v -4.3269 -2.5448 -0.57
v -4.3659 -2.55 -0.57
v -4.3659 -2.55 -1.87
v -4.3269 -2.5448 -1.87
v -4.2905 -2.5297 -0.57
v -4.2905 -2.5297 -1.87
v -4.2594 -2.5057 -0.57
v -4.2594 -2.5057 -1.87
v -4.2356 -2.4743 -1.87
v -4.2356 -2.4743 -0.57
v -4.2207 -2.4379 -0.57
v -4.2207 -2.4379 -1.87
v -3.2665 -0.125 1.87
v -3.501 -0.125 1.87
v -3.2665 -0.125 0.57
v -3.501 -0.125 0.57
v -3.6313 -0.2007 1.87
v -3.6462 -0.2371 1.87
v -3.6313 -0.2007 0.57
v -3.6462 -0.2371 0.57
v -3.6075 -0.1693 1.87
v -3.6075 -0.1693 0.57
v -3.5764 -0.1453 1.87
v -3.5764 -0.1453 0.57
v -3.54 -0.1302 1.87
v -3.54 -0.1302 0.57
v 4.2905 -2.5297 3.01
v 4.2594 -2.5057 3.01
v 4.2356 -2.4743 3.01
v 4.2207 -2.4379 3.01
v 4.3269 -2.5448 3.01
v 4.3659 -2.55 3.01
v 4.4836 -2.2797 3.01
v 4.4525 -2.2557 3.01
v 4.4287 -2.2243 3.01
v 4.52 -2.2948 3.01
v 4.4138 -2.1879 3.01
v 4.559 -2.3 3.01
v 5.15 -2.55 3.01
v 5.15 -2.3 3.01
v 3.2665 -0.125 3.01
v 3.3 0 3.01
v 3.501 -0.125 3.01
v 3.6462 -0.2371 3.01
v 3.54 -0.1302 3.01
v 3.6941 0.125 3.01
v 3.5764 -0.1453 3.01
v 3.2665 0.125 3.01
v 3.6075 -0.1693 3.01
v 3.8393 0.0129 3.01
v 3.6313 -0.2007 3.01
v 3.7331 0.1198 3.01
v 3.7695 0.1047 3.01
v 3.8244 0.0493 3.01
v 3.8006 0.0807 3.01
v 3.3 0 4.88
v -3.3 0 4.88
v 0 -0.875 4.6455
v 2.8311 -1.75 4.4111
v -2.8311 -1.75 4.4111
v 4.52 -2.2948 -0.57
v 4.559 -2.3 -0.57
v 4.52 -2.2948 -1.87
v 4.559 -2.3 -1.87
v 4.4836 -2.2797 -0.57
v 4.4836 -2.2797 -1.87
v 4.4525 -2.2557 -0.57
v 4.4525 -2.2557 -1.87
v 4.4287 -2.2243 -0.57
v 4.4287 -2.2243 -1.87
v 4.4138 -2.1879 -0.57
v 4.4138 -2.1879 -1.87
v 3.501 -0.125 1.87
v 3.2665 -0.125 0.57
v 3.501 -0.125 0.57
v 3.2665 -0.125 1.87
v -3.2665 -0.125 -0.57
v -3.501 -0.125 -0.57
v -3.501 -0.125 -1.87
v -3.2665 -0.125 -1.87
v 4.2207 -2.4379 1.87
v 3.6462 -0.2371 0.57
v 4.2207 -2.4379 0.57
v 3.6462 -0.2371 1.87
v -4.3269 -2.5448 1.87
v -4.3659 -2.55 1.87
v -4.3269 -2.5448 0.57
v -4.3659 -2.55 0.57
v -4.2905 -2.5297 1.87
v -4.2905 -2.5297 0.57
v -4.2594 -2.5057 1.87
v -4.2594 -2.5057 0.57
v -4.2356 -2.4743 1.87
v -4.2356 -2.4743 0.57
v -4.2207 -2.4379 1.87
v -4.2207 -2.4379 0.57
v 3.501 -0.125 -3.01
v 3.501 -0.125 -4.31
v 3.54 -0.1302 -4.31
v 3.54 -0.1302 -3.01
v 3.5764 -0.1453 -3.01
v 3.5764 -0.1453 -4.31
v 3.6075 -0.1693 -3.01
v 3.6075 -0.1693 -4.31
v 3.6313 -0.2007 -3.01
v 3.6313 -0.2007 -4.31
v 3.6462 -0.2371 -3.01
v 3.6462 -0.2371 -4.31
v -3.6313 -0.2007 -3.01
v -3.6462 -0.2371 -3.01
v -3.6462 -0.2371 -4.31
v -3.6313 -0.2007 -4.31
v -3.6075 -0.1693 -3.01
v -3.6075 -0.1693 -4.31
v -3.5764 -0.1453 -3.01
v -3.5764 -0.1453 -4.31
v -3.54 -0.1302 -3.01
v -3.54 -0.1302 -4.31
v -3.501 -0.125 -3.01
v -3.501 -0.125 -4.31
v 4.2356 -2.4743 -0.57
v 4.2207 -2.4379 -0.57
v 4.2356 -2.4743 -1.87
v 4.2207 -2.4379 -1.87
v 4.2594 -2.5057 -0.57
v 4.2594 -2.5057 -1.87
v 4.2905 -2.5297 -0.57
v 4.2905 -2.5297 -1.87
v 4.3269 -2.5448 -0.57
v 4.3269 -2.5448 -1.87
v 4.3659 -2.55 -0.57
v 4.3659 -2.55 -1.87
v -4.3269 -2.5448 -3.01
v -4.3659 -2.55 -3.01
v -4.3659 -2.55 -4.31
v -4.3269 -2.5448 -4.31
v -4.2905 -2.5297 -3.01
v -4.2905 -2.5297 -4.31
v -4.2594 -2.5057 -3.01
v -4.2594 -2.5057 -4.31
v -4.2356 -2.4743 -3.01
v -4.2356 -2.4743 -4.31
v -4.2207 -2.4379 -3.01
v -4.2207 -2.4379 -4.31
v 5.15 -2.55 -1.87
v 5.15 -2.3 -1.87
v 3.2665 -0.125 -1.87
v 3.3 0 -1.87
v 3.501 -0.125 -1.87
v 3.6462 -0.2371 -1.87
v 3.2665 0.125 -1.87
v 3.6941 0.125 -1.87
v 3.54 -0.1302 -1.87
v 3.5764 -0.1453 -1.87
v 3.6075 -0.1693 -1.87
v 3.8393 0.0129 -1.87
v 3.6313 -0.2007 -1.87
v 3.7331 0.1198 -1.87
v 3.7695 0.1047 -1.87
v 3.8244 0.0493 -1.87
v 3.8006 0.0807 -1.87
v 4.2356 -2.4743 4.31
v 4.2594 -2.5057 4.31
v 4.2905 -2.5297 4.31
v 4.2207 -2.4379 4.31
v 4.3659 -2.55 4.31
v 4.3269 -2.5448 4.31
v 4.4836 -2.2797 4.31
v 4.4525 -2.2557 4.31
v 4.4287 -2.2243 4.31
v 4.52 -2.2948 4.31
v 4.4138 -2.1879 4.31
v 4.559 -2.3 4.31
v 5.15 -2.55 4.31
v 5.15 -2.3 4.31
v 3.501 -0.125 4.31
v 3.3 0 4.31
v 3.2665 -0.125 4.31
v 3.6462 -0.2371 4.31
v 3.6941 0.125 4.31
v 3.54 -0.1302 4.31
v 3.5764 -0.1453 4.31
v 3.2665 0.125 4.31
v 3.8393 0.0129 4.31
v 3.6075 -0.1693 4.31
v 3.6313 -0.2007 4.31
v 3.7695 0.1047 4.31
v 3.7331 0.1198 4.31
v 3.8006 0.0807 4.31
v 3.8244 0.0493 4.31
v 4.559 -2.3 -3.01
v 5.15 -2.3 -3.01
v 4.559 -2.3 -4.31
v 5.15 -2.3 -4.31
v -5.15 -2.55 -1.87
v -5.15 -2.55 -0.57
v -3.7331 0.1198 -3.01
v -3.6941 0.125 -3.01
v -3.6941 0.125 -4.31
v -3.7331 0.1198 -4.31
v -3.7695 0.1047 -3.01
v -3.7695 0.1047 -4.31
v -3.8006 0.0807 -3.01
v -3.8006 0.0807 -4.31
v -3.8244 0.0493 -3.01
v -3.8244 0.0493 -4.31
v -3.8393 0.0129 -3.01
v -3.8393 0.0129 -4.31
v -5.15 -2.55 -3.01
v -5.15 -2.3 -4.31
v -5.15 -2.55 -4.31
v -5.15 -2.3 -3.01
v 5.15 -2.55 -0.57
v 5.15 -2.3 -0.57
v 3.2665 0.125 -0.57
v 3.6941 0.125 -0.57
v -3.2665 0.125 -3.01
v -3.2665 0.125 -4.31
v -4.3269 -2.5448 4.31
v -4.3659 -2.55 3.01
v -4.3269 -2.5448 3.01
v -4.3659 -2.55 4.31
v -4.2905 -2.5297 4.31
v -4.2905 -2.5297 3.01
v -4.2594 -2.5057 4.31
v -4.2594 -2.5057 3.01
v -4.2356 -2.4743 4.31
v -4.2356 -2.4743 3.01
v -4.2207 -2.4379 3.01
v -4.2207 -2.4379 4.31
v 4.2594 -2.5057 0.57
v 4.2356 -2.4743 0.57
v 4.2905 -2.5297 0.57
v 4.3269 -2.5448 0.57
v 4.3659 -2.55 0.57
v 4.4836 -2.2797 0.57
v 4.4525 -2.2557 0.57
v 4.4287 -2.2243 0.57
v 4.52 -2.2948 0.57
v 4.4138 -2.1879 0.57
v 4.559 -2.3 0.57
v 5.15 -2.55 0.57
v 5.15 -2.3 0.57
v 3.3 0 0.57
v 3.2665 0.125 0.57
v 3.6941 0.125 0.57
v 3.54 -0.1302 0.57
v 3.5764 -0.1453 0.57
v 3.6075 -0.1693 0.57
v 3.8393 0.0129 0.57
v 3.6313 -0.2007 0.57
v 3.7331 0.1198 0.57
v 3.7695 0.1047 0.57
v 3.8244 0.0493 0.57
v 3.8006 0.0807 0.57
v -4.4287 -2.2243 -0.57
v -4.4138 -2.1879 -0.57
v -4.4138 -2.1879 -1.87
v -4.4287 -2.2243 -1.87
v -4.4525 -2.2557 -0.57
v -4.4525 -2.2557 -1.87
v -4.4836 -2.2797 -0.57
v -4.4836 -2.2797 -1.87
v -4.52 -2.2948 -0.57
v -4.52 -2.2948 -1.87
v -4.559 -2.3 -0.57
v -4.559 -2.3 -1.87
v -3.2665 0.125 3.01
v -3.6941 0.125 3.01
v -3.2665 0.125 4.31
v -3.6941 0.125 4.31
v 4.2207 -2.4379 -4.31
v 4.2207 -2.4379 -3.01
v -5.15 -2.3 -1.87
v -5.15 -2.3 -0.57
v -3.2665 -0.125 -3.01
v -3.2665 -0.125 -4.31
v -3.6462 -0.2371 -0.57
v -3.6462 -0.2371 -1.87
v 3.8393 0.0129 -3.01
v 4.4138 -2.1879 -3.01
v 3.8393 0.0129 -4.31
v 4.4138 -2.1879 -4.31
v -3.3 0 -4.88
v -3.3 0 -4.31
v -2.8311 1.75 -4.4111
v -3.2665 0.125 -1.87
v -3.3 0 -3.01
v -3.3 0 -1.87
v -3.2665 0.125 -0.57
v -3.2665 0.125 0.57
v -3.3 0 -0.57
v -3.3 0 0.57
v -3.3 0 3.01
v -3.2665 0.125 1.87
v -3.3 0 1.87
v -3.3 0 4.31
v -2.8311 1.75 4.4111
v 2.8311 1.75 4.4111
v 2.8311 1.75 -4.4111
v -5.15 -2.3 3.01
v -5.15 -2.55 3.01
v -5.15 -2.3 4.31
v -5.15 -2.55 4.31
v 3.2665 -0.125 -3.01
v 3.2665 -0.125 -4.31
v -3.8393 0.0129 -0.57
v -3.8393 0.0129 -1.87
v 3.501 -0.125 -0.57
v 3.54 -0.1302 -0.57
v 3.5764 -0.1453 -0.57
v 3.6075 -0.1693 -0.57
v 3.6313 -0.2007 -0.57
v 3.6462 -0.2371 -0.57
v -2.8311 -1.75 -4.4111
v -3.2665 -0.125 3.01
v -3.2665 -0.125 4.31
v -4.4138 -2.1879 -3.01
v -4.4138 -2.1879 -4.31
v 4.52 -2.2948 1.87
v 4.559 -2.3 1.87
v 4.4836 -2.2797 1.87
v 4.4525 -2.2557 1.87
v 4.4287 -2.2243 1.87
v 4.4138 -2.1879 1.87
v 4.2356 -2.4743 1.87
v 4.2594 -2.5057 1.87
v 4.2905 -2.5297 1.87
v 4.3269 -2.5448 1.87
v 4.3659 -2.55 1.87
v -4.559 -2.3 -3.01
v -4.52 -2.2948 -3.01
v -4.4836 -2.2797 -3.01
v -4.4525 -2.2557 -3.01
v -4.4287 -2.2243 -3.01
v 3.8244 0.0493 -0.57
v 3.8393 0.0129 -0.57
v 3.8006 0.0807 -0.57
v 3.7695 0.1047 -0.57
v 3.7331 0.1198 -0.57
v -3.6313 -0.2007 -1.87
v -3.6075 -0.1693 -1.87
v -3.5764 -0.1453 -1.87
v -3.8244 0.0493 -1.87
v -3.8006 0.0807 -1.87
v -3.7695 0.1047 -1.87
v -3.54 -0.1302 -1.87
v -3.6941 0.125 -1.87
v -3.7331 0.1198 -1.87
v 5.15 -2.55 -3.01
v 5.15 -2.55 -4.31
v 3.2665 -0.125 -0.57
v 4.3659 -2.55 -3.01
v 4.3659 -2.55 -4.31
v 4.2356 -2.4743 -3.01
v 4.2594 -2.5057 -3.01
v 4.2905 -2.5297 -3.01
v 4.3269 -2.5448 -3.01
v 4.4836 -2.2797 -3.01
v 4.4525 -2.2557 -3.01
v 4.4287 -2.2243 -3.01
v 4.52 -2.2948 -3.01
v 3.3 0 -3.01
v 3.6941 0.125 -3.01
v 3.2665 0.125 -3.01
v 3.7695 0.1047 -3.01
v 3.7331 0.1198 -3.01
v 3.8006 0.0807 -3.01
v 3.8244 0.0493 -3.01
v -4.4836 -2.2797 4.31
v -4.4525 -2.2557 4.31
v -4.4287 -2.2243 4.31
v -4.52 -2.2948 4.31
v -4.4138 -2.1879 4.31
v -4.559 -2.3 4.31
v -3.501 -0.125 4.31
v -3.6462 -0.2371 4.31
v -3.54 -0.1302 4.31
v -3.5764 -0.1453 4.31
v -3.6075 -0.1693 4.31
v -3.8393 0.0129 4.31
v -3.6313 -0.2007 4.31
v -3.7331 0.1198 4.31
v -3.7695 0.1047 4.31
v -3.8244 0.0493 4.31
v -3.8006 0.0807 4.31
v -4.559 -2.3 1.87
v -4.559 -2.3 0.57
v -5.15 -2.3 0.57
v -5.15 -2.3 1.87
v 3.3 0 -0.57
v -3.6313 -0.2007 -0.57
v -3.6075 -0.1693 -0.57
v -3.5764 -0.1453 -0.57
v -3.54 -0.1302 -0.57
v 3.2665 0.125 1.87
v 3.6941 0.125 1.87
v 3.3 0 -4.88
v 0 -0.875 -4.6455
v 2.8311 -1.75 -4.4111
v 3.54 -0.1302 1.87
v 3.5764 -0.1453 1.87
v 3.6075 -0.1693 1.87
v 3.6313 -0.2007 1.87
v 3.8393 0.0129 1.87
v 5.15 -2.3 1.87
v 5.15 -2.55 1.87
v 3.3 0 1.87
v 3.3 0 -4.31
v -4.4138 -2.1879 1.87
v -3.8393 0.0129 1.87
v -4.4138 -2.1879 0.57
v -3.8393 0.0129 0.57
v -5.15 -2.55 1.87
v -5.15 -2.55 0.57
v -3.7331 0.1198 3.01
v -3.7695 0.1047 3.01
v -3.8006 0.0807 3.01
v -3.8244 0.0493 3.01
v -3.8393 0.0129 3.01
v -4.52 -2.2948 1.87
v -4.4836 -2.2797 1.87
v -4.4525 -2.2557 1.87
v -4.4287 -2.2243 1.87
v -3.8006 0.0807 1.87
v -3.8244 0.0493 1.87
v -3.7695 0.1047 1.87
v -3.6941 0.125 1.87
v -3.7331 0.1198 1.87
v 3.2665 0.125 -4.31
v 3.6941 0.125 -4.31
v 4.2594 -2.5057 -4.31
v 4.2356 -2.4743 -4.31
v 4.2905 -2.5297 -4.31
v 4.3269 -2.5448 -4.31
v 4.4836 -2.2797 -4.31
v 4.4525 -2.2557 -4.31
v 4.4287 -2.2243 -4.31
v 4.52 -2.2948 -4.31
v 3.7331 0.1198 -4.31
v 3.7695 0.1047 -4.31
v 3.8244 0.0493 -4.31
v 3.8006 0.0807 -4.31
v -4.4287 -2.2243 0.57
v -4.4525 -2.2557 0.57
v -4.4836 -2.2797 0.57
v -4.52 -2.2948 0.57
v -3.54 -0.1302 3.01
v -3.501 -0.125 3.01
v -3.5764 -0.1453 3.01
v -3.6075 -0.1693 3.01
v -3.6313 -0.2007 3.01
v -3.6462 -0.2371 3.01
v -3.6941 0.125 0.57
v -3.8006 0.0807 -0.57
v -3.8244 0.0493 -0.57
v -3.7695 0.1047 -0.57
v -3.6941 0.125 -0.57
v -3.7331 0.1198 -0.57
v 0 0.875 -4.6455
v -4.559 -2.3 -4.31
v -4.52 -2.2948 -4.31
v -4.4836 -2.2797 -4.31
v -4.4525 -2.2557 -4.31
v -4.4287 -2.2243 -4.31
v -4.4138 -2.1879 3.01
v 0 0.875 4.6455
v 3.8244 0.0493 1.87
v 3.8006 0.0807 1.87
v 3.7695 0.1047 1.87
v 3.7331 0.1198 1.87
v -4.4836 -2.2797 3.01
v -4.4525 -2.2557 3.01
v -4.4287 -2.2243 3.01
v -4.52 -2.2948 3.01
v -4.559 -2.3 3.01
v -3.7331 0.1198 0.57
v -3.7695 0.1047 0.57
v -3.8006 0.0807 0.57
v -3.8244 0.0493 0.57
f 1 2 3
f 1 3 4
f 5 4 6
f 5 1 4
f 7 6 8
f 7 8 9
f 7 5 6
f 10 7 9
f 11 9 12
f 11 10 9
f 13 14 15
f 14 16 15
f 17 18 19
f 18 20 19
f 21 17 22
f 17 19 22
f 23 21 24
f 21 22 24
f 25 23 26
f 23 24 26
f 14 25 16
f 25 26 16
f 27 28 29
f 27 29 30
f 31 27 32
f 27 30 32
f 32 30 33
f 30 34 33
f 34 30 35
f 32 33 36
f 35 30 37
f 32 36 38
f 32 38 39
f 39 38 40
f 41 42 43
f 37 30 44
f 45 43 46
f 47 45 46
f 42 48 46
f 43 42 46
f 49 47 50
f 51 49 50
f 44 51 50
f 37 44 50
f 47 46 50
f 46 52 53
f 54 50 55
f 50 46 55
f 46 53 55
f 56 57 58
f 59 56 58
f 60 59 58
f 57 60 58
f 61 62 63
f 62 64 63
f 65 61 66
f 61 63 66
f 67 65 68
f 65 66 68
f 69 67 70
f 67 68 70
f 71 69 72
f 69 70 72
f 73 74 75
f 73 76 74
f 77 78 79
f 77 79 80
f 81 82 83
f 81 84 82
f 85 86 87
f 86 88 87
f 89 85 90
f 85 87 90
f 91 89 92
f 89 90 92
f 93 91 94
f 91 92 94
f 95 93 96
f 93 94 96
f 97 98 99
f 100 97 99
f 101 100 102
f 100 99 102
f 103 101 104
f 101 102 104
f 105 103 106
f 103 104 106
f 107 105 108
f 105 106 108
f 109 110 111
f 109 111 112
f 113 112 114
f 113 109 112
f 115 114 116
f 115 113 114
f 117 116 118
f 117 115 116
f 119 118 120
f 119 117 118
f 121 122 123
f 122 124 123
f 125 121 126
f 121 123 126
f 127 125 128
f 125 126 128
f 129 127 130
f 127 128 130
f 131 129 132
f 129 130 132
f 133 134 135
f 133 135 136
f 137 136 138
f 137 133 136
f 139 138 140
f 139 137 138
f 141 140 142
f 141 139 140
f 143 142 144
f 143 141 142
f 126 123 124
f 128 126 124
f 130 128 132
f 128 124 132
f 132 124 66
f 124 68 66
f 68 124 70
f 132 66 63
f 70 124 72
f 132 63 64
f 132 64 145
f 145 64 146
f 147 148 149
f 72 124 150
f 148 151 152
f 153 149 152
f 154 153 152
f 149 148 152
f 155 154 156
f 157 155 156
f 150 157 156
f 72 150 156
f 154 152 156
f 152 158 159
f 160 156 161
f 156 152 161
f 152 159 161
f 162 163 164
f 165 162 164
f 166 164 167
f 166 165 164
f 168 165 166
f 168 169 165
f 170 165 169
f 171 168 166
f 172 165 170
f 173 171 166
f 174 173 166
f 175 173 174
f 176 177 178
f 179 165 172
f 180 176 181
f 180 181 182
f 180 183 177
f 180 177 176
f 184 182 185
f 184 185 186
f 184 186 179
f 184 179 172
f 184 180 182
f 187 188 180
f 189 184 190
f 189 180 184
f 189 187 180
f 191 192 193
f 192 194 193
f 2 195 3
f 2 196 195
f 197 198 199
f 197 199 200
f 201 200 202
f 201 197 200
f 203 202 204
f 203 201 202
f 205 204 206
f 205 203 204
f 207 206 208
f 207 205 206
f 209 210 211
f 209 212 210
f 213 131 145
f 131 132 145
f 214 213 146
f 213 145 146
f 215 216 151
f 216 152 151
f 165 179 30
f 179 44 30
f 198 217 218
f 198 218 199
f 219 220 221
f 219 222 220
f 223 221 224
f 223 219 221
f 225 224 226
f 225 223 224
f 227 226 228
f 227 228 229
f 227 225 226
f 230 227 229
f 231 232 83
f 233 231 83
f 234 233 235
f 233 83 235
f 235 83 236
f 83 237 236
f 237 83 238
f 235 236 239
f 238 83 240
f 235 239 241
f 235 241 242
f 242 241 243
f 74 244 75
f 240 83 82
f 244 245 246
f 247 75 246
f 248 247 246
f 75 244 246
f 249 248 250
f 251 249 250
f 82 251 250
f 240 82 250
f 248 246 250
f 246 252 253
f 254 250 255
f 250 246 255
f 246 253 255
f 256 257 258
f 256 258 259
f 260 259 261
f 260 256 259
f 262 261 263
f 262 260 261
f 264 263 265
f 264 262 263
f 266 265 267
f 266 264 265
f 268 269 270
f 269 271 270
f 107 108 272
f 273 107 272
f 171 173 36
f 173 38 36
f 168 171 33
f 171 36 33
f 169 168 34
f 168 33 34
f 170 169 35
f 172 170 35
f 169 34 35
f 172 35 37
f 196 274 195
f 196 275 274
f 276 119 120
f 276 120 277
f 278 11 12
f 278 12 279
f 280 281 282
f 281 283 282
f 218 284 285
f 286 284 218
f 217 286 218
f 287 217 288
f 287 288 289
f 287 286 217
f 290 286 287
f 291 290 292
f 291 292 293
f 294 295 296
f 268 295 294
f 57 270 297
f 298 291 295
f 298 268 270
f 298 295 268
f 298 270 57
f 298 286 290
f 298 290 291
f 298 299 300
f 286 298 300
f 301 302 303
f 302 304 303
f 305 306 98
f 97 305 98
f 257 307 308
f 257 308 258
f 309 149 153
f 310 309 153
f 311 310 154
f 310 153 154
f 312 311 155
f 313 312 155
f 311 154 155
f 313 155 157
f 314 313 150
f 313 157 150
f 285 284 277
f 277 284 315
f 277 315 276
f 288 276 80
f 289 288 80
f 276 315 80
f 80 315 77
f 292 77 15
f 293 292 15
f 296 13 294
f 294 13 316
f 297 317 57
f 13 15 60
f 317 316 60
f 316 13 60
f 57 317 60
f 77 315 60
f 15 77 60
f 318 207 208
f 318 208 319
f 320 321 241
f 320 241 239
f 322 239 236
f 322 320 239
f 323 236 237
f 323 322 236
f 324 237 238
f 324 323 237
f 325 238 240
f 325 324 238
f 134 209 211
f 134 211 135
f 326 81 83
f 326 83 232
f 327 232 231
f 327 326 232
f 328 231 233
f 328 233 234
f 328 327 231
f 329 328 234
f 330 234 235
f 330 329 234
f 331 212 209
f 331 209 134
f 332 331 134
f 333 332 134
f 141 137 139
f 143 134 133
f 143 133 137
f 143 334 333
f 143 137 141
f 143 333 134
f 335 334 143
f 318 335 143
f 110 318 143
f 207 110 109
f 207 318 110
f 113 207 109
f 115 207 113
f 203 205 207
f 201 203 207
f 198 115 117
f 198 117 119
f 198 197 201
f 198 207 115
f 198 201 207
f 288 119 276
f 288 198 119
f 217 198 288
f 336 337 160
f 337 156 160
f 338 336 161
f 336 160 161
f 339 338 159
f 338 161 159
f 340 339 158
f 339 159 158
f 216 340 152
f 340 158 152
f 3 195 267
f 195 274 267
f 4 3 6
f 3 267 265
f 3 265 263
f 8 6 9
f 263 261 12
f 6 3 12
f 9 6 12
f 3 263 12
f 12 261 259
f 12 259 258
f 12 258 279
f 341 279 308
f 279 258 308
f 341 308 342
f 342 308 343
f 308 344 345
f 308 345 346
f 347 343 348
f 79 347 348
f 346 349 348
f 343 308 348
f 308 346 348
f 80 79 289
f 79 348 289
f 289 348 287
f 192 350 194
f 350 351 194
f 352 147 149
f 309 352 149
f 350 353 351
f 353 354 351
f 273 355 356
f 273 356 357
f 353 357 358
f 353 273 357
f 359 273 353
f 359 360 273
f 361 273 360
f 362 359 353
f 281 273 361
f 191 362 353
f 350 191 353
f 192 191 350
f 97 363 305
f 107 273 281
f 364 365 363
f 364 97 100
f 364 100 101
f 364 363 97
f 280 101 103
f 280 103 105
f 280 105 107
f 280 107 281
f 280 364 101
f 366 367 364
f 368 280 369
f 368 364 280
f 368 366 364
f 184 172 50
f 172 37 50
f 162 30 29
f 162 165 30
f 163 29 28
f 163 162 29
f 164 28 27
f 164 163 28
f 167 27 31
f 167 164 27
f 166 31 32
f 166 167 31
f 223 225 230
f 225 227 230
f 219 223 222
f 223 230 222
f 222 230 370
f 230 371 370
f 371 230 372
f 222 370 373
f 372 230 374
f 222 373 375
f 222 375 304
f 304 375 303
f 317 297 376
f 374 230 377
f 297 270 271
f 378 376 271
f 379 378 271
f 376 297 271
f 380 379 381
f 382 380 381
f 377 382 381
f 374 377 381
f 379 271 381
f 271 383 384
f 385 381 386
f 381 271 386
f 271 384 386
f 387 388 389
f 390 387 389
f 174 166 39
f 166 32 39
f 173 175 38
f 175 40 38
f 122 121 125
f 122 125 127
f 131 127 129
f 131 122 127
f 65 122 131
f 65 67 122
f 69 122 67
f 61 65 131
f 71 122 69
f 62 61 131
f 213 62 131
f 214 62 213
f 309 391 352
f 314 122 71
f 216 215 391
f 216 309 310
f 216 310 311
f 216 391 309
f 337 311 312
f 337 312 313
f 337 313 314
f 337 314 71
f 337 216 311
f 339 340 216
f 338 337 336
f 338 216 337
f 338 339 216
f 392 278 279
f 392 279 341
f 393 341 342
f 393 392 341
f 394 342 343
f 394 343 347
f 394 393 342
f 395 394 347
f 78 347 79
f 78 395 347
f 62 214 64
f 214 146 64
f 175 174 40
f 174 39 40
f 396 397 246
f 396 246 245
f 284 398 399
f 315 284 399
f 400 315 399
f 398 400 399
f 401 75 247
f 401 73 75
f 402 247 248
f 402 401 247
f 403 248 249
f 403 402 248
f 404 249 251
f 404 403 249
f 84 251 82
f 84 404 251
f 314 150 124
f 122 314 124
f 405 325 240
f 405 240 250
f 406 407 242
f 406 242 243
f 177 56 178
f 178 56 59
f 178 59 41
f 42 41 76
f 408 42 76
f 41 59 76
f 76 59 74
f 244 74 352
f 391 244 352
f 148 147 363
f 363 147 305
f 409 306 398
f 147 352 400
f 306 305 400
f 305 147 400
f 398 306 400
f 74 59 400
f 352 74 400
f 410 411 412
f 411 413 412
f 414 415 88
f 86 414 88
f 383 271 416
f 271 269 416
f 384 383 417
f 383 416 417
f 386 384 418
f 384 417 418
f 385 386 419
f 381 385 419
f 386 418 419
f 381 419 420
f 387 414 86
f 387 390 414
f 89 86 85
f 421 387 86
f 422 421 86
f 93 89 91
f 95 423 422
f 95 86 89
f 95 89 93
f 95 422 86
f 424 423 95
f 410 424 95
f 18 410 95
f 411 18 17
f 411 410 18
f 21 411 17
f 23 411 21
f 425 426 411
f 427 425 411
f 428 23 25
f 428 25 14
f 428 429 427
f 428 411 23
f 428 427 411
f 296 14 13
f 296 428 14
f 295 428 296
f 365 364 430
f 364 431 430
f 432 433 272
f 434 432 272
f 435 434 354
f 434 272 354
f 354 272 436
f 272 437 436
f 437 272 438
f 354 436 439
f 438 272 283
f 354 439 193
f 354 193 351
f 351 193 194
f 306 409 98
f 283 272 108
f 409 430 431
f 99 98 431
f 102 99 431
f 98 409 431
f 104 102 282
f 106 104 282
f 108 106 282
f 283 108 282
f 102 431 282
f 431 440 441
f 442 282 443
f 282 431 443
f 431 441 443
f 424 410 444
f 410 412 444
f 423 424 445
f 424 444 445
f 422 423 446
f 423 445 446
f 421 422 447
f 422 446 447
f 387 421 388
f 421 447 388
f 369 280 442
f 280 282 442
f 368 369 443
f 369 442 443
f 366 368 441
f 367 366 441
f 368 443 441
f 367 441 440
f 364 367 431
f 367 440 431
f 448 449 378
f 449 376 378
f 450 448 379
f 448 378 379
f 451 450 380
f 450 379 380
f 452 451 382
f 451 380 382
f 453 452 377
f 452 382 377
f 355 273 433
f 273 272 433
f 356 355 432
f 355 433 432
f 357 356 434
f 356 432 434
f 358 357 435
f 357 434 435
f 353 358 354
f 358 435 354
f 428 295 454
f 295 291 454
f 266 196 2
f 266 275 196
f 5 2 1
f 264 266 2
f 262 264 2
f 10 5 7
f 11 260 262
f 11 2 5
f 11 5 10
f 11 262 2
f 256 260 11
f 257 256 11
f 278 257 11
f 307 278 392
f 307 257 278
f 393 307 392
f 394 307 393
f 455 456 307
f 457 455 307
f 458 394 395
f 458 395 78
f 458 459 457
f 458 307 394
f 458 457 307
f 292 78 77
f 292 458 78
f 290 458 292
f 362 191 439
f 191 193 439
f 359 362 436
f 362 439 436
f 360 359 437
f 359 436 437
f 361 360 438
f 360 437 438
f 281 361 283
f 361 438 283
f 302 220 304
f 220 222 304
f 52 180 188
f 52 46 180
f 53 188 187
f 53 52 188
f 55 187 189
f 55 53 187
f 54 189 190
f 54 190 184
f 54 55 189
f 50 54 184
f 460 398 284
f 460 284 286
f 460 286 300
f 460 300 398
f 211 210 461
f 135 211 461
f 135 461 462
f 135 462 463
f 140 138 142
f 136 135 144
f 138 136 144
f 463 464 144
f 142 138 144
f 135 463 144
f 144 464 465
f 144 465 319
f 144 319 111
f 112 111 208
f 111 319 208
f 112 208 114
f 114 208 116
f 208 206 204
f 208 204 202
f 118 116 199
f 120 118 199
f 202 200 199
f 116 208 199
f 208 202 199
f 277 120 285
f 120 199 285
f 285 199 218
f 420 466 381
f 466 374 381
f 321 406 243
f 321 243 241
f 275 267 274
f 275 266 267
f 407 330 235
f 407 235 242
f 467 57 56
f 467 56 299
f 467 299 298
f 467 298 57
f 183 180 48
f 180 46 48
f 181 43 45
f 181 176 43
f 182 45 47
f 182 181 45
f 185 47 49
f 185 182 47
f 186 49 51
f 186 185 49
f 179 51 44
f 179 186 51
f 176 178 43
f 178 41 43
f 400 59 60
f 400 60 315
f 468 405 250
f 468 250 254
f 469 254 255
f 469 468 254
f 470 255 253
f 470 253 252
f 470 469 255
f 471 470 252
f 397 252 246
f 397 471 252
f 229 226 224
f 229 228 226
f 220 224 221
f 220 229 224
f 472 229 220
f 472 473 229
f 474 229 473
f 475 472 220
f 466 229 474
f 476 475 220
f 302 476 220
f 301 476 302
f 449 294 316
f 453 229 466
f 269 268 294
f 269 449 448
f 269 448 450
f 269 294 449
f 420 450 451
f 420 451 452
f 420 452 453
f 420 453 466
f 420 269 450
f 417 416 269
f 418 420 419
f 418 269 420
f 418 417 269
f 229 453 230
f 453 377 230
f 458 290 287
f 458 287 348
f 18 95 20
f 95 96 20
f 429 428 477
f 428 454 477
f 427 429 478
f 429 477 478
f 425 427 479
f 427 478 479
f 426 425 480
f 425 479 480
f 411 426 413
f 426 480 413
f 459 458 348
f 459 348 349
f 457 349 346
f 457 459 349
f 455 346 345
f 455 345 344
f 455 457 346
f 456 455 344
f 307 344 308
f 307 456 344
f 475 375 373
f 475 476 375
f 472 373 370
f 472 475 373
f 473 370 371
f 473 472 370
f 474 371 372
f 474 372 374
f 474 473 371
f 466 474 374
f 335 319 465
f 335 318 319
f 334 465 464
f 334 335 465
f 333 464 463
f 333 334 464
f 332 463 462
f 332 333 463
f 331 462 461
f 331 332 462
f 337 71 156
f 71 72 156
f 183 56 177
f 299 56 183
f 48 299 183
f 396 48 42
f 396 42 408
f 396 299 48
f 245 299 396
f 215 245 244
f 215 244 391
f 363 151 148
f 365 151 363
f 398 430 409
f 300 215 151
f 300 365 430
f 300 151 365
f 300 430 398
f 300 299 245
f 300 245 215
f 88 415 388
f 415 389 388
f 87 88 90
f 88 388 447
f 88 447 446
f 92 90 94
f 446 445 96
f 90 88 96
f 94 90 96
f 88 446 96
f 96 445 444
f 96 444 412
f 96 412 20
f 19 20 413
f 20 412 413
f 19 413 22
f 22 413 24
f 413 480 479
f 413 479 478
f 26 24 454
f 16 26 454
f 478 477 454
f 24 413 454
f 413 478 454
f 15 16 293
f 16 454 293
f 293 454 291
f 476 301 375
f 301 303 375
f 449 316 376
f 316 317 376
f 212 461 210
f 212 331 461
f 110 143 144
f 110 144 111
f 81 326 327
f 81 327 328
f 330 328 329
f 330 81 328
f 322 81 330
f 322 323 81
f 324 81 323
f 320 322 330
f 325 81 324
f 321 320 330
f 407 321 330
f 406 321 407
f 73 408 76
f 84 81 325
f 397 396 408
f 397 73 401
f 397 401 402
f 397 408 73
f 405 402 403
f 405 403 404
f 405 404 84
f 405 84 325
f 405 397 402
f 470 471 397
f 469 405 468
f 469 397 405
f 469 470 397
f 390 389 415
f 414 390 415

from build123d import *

# Parameters (mm, degrees)
SKETCH2_W                     = 6.6
SKETCH2_H                     = 9.76
BOSS_EXTRUDE1_DEPTH           = 1.75
BOSS_EXTRUDE1_TAPER           = 15
BOSS_EXTRUDE1_OTHER_WAY_DEPTH = 1.75
BOSS_EXTRUDE1_OTHER_WAY_TAPER = 15
BOSS_EXTRUDE2_DEPTH           = 0.65
FILLET1_R                     = 0.15
BOSS_EXTRUDE3_DEPTH           = 0.65
BOSS_EXTRUDE4_DEPTH           = 0.65
BOSS_EXTRUDE5_DEPTH           = 0.65


with BuildPart() as part:
    # Sketch2 → Boss-Extrude1 (new body)
    with BuildSketch(Plane(origin=(0, 0, 0), x_dir=(1, 0, 0), z_dir=(0, 1, 0))):
        Rectangle(SKETCH2_W, SKETCH2_H)
    extrude(amount=BOSS_EXTRUDE1_DEPTH, taper=BOSS_EXTRUDE1_TAPER)

    # Sketch2 → Boss-Extrude1 other way (add)
    with BuildSketch(Plane(origin=(0, 0, 0), x_dir=(1, 0, 0), z_dir=(0, 1, 0))):
        Rectangle(SKETCH2_W, SKETCH2_H)
    extrude(amount=-BOSS_EXTRUDE1_OTHER_WAY_DEPTH, taper=BOSS_EXTRUDE1_OTHER_WAY_TAPER)

    # Sketch3 → Boss-Extrude2 (add, symmetric)
    with BuildSketch(Plane.XY.offset(3.66)):
        Polygon((3.266506351, 0.125), (3.3, 0), (3.266506351, -0.125), (3.616889449, -0.125), (4.25, -2.55), (5.15, -2.55), (5.15, -2.3), (4.443110551, -2.3), (3.81, 0.125), align=None)
        Polygon((-4.25, -2.55), (-5.15, -2.55), (-5.15, -2.3), (-4.443110551, -2.3), (-3.81, 0.125), (-3.266506351, 0.125), (-3.3, 0), (-3.266506351, -0.125), (-3.616889449, -0.125), align=None)
    extrude(amount=BOSS_EXTRUDE2_DEPTH, both=True)

    # Fillet1
    fillet1_edges = [part.edges().sort_by_distance(p)[0] for p in [
        (4.443110551, -2.3, 3.66),
        (3.81, 0.125, 3.66),
        (3.616889449, -0.125, 3.66),
        (4.25, -2.55, 3.66),
        (-4.25, -2.55, 3.66),
        (-3.616889449, -0.125, 3.66),
        (-3.81, 0.125, 3.66),
        (-4.443110551, -2.3, 3.66),
    ]]
    fillet(fillet1_edges, radius=FILLET1_R)

    # Sketch5 → Boss-Extrude3 (add, symmetric)
    with BuildSketch(Plane.XY.offset(1.22)):
        with BuildLine():
            Line((-5.15, -2.55), (-4.365866331, -2.55))
            ThreePointArc((-4.365866331, -2.55), (-4.274170395, -2.518709121), (-4.220731079, -2.437891406))
            Line((-4.220731079, -2.437891406), (-3.64615837, -0.237108594))
            ThreePointArc((-3.64615837, -0.237108594), (-3.592719053, -0.156290879), (-3.501023118, -0.125))
            Line((-3.501023118, -0.125), (-3.266506351, -0.125))
            Line((-3.266506351, -0.125), (-3.3, 0))
            Line((-3.3, 0), (-3.266506351, 0.125))
            Line((-3.266506351, 0.125), (-3.694133669, 0.125))
            ThreePointArc((-3.694133669, 0.125), (-3.785829605, 0.093709121), (-3.839268921, 0.012891406))
            Line((-3.839268921, 0.012891406), (-4.41384163, -2.187891406))
            ThreePointArc((-4.41384163, -2.187891406), (-4.467280947, -2.268709121), (-4.558976882, -2.3))
            Line((-4.558976882, -2.3), (-5.15, -2.3))
            Line((-5.15, -2.3), (-5.15, -2.55))
        make_face()
        with BuildLine():
            Line((3.64615837, -0.237108594), (4.220731079, -2.437891406))
            ThreePointArc((4.220731079, -2.437891406), (4.274170395, -2.518709121), (4.365866331, -2.55))
            Line((4.365866331, -2.55), (5.15, -2.55))
            Line((5.15, -2.55), (5.15, -2.3))
            Line((5.15, -2.3), (4.558976882, -2.3))
            ThreePointArc((4.558976882, -2.3), (4.467280947, -2.268709121), (4.41384163, -2.187891406))
            Line((4.41384163, -2.187891406), (3.839268921, 0.012891406))
            ThreePointArc((3.839268921, 0.012891406), (3.785829605, 0.093709121), (3.694133669, 0.125))
            Line((3.694133669, 0.125), (3.266506351, 0.125))
            Line((3.266506351, 0.125), (3.3, 0))
            Line((3.3, 0), (3.266506351, -0.125))
            Line((3.266506351, -0.125), (3.501023118, -0.125))
            ThreePointArc((3.501023118, -0.125), (3.592719053, -0.156290879), (3.64615837, -0.237108594))
        make_face()
    extrude(amount=BOSS_EXTRUDE3_DEPTH, both=True)

    # Sketch6 → Boss-Extrude4 (add, symmetric)
    with BuildSketch(Plane.XY.offset(-1.22)):
        with BuildLine():
            Line((3.64615837, -0.237108594), (4.220731079, -2.437891406))
            ThreePointArc((4.220731079, -2.437891406), (4.274170395, -2.518709121), (4.365866331, -2.55))
            Line((4.365866331, -2.55), (5.15, -2.55))
            Line((5.15, -2.55), (5.15, -2.3))
            Line((5.15, -2.3), (4.558976882, -2.3))
            ThreePointArc((4.558976882, -2.3), (4.467280947, -2.268709121), (4.41384163, -2.187891406))
            Line((4.41384163, -2.187891406), (3.839268921, 0.012891406))
            ThreePointArc((3.839268921, 0.012891406), (3.785829605, 0.093709121), (3.694133669, 0.125))
            Line((3.694133669, 0.125), (3.266506351, 0.125))
            Line((3.266506351, 0.125), (3.3, 0))
            Line((3.3, 0), (3.266506351, -0.125))
            Line((3.266506351, -0.125), (3.501023118, -0.125))
            ThreePointArc((3.501023118, -0.125), (3.592719053, -0.156290879), (3.64615837, -0.237108594))
        make_face()
        with BuildLine():
            Line((-5.15, -2.55), (-4.365866331, -2.55))
            ThreePointArc((-4.365866331, -2.55), (-4.274170395, -2.518709121), (-4.220731079, -2.437891406))
            Line((-4.220731079, -2.437891406), (-3.64615837, -0.237108594))
            ThreePointArc((-3.64615837, -0.237108594), (-3.592719053, -0.156290879), (-3.501023118, -0.125))
            Line((-3.501023118, -0.125), (-3.266506351, -0.125))
            Line((-3.266506351, -0.125), (-3.3, 0))
            Line((-3.3, 0), (-3.266506351, 0.125))
            Line((-3.266506351, 0.125), (-3.694133669, 0.125))
            ThreePointArc((-3.694133669, 0.125), (-3.785829605, 0.093709121), (-3.839268921, 0.012891406))
            Line((-3.839268921, 0.012891406), (-4.41384163, -2.187891406))
            ThreePointArc((-4.41384163, -2.187891406), (-4.467280947, -2.268709121), (-4.558976882, -2.3))
            Line((-4.558976882, -2.3), (-5.15, -2.3))
            Line((-5.15, -2.3), (-5.15, -2.55))
        make_face()
    extrude(amount=BOSS_EXTRUDE4_DEPTH, both=True)

    # Sketch7 → Boss-Extrude5 (add, symmetric)
    with BuildSketch(Plane.XY.offset(-3.66)):
        with BuildLine():
            Line((3.64615837, -0.237108594), (4.220731079, -2.437891406))
            ThreePointArc((4.220731079, -2.437891406), (4.274170395, -2.518709121), (4.365866331, -2.55))
            Line((4.365866331, -2.55), (5.15, -2.55))
            Line((5.15, -2.55), (5.15, -2.3))
            Line((5.15, -2.3), (4.558976882, -2.3))
            ThreePointArc((4.558976882, -2.3), (4.467280947, -2.268709121), (4.41384163, -2.187891406))
            Line((4.41384163, -2.187891406), (3.839268921, 0.012891406))
            ThreePointArc((3.839268921, 0.012891406), (3.785829605, 0.093709121), (3.694133669, 0.125))
            Line((3.694133669, 0.125), (3.266506351, 0.125))
            Line((3.266506351, 0.125), (3.3, 0))
            Line((3.3, 0), (3.266506351, -0.125))
            Line((3.266506351, -0.125), (3.501023118, -0.125))
            ThreePointArc((3.501023118, -0.125), (3.592719053, -0.156290879), (3.64615837, -0.237108594))
        make_face()
        with BuildLine():
            Line((-5.15, -2.3), (-5.15, -2.55))
            Line((-5.15, -2.55), (-4.365866331, -2.55))
            ThreePointArc((-4.365866331, -2.55), (-4.274170395, -2.518709121), (-4.220731079, -2.437891406))
            Line((-4.220731079, -2.437891406), (-3.64615837, -0.237108594))
            ThreePointArc((-3.64615837, -0.237108594), (-3.592719053, -0.156290879), (-3.501023118, -0.125))
            Line((-3.501023118, -0.125), (-3.266506351, -0.125))
            Line((-3.266506351, -0.125), (-3.3, 0))
            Line((-3.3, 0), (-3.266506351, 0.125))
            Line((-3.266506351, 0.125), (-3.694133669, 0.125))
            ThreePointArc((-3.694133669, 0.125), (-3.785829605, 0.093709121), (-3.839268921, 0.012891406))
            Line((-3.839268921, 0.012891406), (-4.41384163, -2.187891406))
            ThreePointArc((-4.41384163, -2.187891406), (-4.467280947, -2.268709121), (-4.558976882, -2.3))
            Line((-4.558976882, -2.3), (-5.15, -2.3))
        make_face()
    extrude(amount=BOSS_EXTRUDE5_DEPTH, both=True)


solid = part.part
